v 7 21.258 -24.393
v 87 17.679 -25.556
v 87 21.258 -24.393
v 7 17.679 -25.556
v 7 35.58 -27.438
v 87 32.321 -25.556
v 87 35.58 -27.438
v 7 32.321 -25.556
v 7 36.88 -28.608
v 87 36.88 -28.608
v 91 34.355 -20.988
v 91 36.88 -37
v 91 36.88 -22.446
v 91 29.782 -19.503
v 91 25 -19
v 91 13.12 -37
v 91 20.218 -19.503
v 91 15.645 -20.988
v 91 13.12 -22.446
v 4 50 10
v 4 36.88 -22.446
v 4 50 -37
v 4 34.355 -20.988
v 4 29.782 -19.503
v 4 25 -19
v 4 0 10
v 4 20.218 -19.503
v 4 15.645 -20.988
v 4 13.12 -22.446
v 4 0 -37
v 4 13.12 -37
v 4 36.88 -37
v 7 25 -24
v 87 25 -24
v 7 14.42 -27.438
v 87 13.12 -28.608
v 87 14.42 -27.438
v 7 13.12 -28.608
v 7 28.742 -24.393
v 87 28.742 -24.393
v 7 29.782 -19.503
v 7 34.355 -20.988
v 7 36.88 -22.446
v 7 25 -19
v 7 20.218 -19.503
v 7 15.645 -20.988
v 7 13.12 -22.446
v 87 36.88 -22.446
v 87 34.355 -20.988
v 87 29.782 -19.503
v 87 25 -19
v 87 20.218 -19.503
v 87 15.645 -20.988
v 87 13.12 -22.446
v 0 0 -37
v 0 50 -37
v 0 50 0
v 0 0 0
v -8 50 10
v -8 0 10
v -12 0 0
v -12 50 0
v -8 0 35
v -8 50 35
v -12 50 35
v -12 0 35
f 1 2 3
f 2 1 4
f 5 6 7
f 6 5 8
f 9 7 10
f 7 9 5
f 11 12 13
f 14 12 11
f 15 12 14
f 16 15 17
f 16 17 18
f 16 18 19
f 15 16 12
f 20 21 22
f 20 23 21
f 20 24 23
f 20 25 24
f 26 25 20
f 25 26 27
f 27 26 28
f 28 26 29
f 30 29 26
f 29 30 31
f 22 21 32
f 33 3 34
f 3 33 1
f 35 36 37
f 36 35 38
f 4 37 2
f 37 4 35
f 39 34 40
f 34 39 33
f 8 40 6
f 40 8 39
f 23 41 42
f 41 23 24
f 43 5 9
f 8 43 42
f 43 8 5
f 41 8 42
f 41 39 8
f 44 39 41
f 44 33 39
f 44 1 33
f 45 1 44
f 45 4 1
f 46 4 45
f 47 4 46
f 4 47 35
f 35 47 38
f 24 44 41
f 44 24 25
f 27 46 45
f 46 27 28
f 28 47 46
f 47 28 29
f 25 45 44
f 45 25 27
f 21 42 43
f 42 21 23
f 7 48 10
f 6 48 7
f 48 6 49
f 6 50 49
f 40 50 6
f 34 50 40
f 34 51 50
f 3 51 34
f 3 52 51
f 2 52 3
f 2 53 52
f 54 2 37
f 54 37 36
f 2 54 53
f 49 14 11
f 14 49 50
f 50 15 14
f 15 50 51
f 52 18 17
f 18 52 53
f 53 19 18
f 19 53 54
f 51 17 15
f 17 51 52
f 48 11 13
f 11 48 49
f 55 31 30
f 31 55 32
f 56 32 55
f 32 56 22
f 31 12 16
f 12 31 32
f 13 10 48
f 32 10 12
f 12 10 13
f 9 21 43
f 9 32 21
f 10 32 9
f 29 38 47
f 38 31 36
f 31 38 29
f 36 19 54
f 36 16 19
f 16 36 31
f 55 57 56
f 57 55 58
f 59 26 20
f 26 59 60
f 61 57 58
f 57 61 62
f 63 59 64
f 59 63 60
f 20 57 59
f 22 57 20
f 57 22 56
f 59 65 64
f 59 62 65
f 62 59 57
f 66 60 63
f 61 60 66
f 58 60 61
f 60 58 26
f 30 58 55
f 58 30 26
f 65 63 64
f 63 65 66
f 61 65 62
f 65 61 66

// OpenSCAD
// printed 50 3 56 60 3
// printed 36 3 80 66 4

// Size of the hole in the middle of the spool
Core_Diameter = 36; // [10:60]
 
// Position of the spool core relative to the holder
Core_Offset = 3; // [0:20]

// Depth of the spool core
Core_Depth = 80; // [10:100]

// How much of the core to print
Percentage = 66; // [10:100]

module dont_customize(){}

wall = 4;

notch_y = 50;
notch_z = 10;
notch_x = 8;

tab_z = 50-15;
tab_x = wall;

hang_z = 47;
hang_x = wall;

drop_z=42;

p1 = 50;
p2 = 50;

hang_d = Core_Diameter + 10;

translate([-notch_x,0,0]) cube([notch_x,notch_y,notch_z]);
translate([-notch_x-tab_x,0,0]) cube([tab_x,notch_y,tab_z]);
translate([0,0,-hang_z+notch_z]) cube([hang_x,notch_y,hang_z]);

translate([wall,notch_y/2,-drop_z]) rotate([0,90,0]) {
    intersection()
    {
        union()
        {
            cylinder(d=Core_Diameter,h=Core_Offset+Core_Depth+hang_x);
            translate([0,0,0]) cylinder(d=hang_d,h=Core_Offset);
            translate([0,0,Core_Offset+Core_Depth]) cylinder(d=hang_d,h=wall);
         }
        translate([-105,-Core_Diameter/100*Percentage/2,0]) cube([100,Core_Diameter/100*Percentage,200]);
    }
}
